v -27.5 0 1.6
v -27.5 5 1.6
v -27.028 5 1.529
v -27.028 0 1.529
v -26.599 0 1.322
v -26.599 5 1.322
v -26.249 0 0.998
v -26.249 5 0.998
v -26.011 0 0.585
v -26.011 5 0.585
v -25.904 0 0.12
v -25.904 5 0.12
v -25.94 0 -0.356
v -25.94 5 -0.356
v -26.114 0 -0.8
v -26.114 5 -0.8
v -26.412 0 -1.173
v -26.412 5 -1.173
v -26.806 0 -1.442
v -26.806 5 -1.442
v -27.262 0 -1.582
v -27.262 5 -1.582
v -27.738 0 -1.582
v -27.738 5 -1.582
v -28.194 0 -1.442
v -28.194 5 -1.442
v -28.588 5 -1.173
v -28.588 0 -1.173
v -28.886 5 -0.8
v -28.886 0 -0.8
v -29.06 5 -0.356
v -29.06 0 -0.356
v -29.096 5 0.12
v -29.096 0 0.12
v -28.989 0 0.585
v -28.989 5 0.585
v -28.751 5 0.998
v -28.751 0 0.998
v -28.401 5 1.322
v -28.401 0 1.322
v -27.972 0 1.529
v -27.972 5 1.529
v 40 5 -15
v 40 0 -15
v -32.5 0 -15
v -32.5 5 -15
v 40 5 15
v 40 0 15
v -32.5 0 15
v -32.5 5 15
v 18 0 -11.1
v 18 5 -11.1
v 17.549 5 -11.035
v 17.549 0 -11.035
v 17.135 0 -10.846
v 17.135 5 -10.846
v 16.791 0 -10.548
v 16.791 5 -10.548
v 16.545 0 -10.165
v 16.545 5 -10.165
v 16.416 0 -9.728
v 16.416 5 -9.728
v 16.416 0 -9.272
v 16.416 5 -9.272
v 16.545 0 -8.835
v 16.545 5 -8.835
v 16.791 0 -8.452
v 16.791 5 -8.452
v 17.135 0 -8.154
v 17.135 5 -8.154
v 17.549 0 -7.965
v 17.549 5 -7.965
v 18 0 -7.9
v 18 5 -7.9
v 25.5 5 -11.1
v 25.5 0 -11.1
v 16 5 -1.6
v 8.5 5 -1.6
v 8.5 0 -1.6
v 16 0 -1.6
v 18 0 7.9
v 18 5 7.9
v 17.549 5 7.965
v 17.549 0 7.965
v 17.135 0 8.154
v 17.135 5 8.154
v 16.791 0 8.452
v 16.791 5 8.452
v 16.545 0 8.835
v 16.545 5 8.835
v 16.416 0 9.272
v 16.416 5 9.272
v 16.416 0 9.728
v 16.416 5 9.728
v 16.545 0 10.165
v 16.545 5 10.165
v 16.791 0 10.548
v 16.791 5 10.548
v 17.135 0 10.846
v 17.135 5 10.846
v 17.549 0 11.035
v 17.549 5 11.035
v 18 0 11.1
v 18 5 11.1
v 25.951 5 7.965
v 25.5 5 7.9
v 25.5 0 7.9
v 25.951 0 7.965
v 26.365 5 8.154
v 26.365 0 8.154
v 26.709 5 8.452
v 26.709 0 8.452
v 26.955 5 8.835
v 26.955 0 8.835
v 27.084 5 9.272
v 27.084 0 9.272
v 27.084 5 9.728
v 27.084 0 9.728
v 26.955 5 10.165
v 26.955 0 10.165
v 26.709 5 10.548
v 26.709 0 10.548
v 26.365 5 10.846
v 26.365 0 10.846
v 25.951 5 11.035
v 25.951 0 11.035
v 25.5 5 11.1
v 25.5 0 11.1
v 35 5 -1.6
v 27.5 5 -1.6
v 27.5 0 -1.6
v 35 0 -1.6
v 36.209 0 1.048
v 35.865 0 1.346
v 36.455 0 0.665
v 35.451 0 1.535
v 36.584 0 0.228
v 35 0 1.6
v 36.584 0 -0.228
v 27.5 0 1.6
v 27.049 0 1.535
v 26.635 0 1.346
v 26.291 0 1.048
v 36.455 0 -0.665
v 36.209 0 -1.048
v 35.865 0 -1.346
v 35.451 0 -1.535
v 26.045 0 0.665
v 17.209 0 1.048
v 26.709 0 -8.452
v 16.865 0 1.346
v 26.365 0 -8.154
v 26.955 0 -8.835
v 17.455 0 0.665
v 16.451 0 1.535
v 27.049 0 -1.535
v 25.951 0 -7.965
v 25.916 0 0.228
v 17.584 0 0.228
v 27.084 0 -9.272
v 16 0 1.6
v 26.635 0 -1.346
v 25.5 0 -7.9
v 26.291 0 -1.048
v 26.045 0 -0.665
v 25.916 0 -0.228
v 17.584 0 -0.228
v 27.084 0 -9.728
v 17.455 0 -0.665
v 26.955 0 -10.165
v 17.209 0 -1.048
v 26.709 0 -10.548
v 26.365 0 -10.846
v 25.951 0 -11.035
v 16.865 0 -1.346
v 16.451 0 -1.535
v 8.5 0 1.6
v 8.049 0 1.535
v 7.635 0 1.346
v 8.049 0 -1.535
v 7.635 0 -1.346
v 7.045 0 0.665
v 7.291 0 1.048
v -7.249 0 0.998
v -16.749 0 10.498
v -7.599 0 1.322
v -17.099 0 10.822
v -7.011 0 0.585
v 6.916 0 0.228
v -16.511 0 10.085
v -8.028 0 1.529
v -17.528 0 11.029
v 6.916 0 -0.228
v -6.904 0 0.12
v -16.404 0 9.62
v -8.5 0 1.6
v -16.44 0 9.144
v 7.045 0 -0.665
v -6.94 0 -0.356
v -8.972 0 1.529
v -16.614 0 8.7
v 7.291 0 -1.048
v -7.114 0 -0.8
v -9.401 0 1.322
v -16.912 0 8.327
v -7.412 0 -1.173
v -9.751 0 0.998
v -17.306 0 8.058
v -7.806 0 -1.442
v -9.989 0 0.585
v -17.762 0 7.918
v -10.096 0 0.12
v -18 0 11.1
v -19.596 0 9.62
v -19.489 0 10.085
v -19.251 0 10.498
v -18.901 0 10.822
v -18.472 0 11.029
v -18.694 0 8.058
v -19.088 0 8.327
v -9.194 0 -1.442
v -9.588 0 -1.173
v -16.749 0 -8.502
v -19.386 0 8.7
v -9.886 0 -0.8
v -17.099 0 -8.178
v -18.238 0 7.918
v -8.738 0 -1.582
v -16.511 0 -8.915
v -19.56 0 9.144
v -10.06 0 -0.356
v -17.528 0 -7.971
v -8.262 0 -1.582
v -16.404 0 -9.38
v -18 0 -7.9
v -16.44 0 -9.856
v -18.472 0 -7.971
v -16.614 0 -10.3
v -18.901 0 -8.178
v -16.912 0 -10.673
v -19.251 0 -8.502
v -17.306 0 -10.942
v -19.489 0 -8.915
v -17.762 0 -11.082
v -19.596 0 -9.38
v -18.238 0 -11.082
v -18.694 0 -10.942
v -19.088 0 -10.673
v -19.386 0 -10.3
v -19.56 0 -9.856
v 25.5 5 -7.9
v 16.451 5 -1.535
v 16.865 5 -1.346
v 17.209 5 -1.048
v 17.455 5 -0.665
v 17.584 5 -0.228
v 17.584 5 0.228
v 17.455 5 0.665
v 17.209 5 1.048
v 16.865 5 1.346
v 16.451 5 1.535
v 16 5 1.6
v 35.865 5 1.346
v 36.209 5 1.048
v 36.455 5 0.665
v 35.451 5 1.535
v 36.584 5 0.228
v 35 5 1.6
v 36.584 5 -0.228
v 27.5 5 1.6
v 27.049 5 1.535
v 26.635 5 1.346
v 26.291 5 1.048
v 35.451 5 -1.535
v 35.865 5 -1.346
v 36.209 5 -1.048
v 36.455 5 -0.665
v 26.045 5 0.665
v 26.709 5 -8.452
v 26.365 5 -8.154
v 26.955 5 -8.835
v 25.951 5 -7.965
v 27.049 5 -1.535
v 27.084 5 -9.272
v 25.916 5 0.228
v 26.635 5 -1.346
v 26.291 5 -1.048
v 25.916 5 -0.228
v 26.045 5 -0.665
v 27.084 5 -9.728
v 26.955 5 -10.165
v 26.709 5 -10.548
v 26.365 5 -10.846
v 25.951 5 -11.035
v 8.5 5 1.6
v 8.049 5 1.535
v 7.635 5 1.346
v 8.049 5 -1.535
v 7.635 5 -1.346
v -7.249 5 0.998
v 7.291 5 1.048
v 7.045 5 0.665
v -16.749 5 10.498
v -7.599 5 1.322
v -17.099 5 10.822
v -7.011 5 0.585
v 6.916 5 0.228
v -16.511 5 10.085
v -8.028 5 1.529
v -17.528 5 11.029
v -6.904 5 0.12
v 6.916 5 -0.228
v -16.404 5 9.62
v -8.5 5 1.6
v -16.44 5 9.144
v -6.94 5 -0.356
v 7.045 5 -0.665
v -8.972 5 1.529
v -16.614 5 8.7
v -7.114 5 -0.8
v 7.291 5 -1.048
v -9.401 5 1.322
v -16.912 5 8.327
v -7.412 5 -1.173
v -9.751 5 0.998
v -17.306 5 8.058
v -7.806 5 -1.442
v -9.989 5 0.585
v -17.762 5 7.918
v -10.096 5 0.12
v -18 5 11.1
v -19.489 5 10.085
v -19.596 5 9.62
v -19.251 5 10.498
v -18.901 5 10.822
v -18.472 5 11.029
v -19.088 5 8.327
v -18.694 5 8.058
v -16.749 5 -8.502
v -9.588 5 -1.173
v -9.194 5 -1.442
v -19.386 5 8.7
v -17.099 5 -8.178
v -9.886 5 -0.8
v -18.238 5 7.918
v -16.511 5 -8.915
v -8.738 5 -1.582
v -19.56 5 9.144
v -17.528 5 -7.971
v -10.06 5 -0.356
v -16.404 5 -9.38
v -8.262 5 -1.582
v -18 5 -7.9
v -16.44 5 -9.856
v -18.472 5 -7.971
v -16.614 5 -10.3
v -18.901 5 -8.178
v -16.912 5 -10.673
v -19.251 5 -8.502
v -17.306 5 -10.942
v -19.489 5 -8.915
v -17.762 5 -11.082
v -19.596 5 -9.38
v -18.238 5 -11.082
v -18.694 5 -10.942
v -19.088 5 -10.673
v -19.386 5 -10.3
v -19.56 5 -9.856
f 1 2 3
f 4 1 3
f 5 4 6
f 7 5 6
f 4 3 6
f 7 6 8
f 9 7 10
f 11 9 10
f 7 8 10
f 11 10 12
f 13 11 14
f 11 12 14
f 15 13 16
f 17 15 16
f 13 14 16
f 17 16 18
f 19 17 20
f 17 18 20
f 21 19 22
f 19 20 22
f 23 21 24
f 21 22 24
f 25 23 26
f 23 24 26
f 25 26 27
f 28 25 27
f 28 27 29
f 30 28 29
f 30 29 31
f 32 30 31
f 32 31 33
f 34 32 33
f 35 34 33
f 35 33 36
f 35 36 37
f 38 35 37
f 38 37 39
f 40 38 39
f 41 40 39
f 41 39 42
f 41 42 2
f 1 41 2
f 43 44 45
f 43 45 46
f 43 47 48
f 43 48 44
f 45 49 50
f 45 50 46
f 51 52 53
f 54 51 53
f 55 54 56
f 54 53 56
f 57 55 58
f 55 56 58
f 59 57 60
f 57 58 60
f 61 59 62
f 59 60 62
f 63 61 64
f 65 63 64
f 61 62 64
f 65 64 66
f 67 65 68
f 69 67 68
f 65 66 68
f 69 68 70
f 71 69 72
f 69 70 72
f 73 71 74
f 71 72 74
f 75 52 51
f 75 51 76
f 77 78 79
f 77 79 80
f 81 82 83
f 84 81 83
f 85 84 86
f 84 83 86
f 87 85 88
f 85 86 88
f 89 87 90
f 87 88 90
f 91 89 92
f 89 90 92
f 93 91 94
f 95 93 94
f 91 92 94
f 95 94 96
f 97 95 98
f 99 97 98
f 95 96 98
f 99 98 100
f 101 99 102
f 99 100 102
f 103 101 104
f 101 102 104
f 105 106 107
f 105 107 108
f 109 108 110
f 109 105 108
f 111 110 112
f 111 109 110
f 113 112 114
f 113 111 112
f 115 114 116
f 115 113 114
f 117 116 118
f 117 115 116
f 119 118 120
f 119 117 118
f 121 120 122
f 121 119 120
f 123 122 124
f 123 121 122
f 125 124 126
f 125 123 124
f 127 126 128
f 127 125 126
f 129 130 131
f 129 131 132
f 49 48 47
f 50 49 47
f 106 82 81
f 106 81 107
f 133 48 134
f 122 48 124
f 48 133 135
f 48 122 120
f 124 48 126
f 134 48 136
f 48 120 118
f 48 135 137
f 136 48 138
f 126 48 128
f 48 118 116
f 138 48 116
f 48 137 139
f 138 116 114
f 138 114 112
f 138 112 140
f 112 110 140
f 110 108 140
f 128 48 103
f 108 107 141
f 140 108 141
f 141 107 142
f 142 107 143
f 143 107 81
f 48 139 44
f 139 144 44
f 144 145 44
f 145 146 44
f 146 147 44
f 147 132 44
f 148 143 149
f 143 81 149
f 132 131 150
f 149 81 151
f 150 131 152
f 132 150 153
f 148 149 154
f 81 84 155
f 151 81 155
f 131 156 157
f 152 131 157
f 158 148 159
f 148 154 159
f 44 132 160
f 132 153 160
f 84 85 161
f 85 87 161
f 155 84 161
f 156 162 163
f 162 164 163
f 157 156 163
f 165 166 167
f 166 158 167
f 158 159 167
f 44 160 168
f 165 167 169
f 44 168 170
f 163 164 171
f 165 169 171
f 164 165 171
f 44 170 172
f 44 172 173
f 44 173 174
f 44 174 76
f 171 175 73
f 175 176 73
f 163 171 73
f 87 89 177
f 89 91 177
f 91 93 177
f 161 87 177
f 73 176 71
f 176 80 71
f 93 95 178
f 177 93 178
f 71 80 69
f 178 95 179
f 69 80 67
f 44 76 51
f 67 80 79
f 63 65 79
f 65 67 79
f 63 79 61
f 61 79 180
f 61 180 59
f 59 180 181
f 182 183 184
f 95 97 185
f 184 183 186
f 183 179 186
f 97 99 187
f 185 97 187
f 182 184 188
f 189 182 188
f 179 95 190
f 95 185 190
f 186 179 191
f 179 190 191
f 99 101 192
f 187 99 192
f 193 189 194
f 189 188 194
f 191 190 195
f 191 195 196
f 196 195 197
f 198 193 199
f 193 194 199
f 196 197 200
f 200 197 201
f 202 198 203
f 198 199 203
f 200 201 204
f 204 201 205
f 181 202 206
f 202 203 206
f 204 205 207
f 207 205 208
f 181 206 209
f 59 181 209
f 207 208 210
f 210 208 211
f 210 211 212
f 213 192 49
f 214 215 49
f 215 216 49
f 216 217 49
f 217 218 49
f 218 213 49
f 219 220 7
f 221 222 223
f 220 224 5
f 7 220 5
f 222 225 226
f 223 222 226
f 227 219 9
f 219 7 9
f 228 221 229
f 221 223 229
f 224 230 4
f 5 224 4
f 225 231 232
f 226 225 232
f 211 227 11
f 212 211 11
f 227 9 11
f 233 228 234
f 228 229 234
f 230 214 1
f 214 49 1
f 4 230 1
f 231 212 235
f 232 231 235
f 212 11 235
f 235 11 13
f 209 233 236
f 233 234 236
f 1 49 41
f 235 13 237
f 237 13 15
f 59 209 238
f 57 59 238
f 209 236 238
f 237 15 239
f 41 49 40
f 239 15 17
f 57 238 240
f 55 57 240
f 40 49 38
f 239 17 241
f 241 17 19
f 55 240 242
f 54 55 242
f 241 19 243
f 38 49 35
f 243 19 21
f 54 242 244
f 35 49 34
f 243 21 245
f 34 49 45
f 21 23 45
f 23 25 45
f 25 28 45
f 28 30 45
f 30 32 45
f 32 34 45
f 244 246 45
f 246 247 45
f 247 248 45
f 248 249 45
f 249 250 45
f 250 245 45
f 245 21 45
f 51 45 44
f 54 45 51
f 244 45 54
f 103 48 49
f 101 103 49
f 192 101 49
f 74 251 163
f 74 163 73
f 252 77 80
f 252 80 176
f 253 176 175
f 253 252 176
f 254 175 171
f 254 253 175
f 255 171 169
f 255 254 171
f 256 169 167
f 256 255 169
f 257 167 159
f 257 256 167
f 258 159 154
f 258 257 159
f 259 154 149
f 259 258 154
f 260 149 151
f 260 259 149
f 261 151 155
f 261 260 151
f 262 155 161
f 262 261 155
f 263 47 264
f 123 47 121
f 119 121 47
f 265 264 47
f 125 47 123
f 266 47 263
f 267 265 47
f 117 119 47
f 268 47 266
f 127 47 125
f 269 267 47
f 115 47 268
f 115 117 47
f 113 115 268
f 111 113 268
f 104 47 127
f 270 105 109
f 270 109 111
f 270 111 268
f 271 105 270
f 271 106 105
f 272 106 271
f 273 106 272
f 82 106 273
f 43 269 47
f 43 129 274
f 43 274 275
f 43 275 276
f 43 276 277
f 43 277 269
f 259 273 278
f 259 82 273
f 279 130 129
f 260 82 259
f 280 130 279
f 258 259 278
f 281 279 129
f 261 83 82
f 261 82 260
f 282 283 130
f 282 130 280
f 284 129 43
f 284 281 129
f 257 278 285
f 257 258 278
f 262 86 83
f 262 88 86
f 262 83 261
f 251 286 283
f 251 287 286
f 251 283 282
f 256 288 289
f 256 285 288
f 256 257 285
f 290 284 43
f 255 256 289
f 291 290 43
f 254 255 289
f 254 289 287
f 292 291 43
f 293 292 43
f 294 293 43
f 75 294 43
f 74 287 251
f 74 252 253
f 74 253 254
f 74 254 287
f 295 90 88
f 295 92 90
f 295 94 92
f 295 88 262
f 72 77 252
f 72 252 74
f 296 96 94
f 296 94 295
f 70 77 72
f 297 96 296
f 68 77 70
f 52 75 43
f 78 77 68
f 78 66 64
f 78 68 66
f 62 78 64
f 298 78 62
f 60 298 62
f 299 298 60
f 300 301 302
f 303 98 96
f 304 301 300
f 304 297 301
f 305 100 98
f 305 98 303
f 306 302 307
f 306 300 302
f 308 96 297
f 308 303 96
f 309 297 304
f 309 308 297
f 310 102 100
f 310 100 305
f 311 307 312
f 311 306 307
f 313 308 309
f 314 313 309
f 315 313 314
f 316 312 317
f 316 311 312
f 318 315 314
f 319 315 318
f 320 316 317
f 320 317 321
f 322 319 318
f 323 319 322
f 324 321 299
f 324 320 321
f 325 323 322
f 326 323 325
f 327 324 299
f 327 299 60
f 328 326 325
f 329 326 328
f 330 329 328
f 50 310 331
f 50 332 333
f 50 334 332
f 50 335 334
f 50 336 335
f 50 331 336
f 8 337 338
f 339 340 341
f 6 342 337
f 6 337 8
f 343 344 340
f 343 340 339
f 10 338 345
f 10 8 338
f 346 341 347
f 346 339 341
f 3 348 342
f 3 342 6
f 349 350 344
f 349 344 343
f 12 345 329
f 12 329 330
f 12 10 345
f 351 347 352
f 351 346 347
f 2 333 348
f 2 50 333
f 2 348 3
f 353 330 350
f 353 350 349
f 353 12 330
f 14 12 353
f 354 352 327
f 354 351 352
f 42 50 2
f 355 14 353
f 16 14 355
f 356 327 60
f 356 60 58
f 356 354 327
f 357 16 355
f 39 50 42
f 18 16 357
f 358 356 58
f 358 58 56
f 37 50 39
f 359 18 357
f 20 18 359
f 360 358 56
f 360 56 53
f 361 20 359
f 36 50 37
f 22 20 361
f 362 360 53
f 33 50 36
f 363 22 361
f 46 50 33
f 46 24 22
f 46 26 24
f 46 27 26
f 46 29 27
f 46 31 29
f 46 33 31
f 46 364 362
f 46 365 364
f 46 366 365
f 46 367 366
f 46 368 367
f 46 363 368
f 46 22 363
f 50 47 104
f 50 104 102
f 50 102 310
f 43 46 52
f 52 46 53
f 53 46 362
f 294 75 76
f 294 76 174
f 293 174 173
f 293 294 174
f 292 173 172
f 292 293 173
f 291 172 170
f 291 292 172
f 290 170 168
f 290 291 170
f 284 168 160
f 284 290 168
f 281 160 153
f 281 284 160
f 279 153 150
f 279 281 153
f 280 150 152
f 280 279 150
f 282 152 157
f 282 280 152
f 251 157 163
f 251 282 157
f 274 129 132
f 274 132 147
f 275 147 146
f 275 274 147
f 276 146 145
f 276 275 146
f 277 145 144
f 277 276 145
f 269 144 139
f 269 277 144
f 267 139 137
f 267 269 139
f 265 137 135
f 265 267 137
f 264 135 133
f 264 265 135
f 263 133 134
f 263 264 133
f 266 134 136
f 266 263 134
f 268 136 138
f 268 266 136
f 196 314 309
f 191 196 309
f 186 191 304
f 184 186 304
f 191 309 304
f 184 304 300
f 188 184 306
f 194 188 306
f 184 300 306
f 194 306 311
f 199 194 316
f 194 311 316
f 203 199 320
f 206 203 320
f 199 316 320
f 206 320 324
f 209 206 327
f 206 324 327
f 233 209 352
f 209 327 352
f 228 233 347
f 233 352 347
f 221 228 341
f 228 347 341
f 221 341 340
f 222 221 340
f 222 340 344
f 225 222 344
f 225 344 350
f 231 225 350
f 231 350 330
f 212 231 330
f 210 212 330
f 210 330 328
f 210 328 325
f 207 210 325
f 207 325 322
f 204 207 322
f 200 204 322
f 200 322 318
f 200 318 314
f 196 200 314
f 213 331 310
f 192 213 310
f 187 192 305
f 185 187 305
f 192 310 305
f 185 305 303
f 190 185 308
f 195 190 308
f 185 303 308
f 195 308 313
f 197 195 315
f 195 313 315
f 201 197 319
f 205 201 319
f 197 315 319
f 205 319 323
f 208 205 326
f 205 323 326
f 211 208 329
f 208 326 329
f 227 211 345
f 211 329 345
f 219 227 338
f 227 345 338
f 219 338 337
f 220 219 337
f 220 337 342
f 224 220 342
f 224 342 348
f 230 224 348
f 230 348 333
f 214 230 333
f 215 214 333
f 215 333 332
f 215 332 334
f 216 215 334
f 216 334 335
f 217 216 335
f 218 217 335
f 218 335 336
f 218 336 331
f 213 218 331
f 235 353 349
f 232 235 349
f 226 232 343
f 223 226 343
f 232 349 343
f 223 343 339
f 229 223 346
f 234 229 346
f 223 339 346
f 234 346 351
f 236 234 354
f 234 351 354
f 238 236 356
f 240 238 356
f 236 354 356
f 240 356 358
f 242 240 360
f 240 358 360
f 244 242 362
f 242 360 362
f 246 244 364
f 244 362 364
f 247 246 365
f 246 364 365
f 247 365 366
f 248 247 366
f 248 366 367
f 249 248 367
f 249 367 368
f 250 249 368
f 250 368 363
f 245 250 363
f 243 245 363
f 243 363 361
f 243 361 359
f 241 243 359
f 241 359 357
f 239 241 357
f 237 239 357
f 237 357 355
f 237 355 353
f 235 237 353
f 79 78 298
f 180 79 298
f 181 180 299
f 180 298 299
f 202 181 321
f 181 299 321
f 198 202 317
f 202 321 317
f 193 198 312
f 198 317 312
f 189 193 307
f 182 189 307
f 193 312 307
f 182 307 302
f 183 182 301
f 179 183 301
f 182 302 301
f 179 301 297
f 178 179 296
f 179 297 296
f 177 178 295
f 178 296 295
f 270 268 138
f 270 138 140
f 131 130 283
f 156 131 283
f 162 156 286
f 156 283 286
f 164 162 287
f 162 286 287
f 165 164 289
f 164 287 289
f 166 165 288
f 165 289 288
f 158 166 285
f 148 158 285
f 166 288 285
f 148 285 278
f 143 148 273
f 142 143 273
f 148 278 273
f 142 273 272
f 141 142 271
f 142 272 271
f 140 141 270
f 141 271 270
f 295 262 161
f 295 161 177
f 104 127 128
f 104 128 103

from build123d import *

# Parameters (mm, degrees)
SKETCH2_W           = 65
SKETCH2_H           = 30
BOSS_EXTRUDE1_DEPTH = 5
SKETCH3_R           = 1.6
CUT_EXTRUDE1_DEPTH  = 37.142080737
SKETCH5_W           = 30
SKETCH5_H           = 5
BOSS_EXTRUDE2_DEPTH = 7.5
CUT_EXTRUDE2_DEPTH  = 10


with BuildPart() as part:
    # Sketch2 → Boss-Extrude1 (new body)
    with BuildSketch(Plane(origin=(0, 0, 0), x_dir=(1, 0, 0), z_dir=(0, 1, 0))):
        Rectangle(SKETCH2_W, SKETCH2_H)
    extrude(amount=BOSS_EXTRUDE1_DEPTH)

    # Sketch3 → Cut-Extrude1 (cut, through all)
    with BuildSketch(Plane(origin=(0, 5, 0), x_dir=(1, 0, 0), z_dir=(0, 1, 0))):
        with Locations(Location((-27.5, 0, 0), (0, 0, 270))):
            Circle(SKETCH3_R)
        with Locations(Location((-18, 9.5, 0), (0, 0, 270))):
            Circle(SKETCH3_R)
        with Locations(Location((-8.5, 0, 0), (0, 0, 270))):
            Circle(SKETCH3_R)
        with Locations(Location((-18, -9.5, 0), (0, 0, 270))):
            Circle(SKETCH3_R)
        with Locations(Location((18, -9.5, 0), (0, 0, 90))):
            Circle(SKETCH3_R)
        with Locations(Location((27.5, 0, 0), (0, 0, 90))):
            Circle(SKETCH3_R)
        with Locations(Location((18, 9.5, 0), (0, 0, 90))):
            Circle(SKETCH3_R)
        with Locations(Location((8.5, 0, 0), (0, 0, 90))):
            Circle(SKETCH3_R)
    extrude(amount=-CUT_EXTRUDE1_DEPTH, mode=Mode.SUBTRACT)

    # Sketch5 → Boss-Extrude2 (add)
    with BuildSketch(Plane(origin=(32.5, 0, 0), x_dir=(0, 0, -1), z_dir=(1, 0, 0))):
        with Locations((0, 2.5)):
            Rectangle(SKETCH5_W, SKETCH5_H)
    extrude(amount=BOSS_EXTRUDE2_DEPTH)

    # Sketch4 → Cut-Extrude2 (cut)
    with BuildSketch(Plane(origin=(0, 5, 0), x_dir=(1, 0, 0), z_dir=(0, 1, 0))):
        with BuildLine():
            Line((8.5, 1.6), (16, 1.6))
            ThreePointArc((16, 1.6), (17.6, 0), (16, -1.6))
            Line((16, -1.6), (8.5, -1.6))
            ThreePointArc((8.5, -1.6), (6.9, 0), (8.5, 1.6))
        make_face()
        with BuildLine():
            Line((27.5, 1.6), (35, 1.6))
            ThreePointArc((35, 1.6), (36.6, 0), (35, -1.6))
            Line((35, -1.6), (27.5, -1.6))
            ThreePointArc((27.5, -1.6), (25.9, 0), (27.5, 1.6))
        make_face()
        with BuildLine():
            Line((18, -7.9), (25.5, -7.9))
            ThreePointArc((25.5, -7.9), (27.1, -9.5), (25.5, -11.1))
            Line((25.5, -11.1), (18, -11.1))
            ThreePointArc((18, -11.1), (16.4, -9.5), (18, -7.9))
        make_face()
        with BuildLine():
            Line((18, 11.1), (25.5, 11.1))
            ThreePointArc((25.5, 11.1), (27.1, 9.5), (25.5, 7.9))
            Line((25.5, 7.9), (18, 7.9))
            ThreePointArc((18, 7.9), (16.4, 9.5), (18, 11.1))
        make_face()
    extrude(amount=-CUT_EXTRUDE2_DEPTH, mode=Mode.SUBTRACT)


solid = part.part
